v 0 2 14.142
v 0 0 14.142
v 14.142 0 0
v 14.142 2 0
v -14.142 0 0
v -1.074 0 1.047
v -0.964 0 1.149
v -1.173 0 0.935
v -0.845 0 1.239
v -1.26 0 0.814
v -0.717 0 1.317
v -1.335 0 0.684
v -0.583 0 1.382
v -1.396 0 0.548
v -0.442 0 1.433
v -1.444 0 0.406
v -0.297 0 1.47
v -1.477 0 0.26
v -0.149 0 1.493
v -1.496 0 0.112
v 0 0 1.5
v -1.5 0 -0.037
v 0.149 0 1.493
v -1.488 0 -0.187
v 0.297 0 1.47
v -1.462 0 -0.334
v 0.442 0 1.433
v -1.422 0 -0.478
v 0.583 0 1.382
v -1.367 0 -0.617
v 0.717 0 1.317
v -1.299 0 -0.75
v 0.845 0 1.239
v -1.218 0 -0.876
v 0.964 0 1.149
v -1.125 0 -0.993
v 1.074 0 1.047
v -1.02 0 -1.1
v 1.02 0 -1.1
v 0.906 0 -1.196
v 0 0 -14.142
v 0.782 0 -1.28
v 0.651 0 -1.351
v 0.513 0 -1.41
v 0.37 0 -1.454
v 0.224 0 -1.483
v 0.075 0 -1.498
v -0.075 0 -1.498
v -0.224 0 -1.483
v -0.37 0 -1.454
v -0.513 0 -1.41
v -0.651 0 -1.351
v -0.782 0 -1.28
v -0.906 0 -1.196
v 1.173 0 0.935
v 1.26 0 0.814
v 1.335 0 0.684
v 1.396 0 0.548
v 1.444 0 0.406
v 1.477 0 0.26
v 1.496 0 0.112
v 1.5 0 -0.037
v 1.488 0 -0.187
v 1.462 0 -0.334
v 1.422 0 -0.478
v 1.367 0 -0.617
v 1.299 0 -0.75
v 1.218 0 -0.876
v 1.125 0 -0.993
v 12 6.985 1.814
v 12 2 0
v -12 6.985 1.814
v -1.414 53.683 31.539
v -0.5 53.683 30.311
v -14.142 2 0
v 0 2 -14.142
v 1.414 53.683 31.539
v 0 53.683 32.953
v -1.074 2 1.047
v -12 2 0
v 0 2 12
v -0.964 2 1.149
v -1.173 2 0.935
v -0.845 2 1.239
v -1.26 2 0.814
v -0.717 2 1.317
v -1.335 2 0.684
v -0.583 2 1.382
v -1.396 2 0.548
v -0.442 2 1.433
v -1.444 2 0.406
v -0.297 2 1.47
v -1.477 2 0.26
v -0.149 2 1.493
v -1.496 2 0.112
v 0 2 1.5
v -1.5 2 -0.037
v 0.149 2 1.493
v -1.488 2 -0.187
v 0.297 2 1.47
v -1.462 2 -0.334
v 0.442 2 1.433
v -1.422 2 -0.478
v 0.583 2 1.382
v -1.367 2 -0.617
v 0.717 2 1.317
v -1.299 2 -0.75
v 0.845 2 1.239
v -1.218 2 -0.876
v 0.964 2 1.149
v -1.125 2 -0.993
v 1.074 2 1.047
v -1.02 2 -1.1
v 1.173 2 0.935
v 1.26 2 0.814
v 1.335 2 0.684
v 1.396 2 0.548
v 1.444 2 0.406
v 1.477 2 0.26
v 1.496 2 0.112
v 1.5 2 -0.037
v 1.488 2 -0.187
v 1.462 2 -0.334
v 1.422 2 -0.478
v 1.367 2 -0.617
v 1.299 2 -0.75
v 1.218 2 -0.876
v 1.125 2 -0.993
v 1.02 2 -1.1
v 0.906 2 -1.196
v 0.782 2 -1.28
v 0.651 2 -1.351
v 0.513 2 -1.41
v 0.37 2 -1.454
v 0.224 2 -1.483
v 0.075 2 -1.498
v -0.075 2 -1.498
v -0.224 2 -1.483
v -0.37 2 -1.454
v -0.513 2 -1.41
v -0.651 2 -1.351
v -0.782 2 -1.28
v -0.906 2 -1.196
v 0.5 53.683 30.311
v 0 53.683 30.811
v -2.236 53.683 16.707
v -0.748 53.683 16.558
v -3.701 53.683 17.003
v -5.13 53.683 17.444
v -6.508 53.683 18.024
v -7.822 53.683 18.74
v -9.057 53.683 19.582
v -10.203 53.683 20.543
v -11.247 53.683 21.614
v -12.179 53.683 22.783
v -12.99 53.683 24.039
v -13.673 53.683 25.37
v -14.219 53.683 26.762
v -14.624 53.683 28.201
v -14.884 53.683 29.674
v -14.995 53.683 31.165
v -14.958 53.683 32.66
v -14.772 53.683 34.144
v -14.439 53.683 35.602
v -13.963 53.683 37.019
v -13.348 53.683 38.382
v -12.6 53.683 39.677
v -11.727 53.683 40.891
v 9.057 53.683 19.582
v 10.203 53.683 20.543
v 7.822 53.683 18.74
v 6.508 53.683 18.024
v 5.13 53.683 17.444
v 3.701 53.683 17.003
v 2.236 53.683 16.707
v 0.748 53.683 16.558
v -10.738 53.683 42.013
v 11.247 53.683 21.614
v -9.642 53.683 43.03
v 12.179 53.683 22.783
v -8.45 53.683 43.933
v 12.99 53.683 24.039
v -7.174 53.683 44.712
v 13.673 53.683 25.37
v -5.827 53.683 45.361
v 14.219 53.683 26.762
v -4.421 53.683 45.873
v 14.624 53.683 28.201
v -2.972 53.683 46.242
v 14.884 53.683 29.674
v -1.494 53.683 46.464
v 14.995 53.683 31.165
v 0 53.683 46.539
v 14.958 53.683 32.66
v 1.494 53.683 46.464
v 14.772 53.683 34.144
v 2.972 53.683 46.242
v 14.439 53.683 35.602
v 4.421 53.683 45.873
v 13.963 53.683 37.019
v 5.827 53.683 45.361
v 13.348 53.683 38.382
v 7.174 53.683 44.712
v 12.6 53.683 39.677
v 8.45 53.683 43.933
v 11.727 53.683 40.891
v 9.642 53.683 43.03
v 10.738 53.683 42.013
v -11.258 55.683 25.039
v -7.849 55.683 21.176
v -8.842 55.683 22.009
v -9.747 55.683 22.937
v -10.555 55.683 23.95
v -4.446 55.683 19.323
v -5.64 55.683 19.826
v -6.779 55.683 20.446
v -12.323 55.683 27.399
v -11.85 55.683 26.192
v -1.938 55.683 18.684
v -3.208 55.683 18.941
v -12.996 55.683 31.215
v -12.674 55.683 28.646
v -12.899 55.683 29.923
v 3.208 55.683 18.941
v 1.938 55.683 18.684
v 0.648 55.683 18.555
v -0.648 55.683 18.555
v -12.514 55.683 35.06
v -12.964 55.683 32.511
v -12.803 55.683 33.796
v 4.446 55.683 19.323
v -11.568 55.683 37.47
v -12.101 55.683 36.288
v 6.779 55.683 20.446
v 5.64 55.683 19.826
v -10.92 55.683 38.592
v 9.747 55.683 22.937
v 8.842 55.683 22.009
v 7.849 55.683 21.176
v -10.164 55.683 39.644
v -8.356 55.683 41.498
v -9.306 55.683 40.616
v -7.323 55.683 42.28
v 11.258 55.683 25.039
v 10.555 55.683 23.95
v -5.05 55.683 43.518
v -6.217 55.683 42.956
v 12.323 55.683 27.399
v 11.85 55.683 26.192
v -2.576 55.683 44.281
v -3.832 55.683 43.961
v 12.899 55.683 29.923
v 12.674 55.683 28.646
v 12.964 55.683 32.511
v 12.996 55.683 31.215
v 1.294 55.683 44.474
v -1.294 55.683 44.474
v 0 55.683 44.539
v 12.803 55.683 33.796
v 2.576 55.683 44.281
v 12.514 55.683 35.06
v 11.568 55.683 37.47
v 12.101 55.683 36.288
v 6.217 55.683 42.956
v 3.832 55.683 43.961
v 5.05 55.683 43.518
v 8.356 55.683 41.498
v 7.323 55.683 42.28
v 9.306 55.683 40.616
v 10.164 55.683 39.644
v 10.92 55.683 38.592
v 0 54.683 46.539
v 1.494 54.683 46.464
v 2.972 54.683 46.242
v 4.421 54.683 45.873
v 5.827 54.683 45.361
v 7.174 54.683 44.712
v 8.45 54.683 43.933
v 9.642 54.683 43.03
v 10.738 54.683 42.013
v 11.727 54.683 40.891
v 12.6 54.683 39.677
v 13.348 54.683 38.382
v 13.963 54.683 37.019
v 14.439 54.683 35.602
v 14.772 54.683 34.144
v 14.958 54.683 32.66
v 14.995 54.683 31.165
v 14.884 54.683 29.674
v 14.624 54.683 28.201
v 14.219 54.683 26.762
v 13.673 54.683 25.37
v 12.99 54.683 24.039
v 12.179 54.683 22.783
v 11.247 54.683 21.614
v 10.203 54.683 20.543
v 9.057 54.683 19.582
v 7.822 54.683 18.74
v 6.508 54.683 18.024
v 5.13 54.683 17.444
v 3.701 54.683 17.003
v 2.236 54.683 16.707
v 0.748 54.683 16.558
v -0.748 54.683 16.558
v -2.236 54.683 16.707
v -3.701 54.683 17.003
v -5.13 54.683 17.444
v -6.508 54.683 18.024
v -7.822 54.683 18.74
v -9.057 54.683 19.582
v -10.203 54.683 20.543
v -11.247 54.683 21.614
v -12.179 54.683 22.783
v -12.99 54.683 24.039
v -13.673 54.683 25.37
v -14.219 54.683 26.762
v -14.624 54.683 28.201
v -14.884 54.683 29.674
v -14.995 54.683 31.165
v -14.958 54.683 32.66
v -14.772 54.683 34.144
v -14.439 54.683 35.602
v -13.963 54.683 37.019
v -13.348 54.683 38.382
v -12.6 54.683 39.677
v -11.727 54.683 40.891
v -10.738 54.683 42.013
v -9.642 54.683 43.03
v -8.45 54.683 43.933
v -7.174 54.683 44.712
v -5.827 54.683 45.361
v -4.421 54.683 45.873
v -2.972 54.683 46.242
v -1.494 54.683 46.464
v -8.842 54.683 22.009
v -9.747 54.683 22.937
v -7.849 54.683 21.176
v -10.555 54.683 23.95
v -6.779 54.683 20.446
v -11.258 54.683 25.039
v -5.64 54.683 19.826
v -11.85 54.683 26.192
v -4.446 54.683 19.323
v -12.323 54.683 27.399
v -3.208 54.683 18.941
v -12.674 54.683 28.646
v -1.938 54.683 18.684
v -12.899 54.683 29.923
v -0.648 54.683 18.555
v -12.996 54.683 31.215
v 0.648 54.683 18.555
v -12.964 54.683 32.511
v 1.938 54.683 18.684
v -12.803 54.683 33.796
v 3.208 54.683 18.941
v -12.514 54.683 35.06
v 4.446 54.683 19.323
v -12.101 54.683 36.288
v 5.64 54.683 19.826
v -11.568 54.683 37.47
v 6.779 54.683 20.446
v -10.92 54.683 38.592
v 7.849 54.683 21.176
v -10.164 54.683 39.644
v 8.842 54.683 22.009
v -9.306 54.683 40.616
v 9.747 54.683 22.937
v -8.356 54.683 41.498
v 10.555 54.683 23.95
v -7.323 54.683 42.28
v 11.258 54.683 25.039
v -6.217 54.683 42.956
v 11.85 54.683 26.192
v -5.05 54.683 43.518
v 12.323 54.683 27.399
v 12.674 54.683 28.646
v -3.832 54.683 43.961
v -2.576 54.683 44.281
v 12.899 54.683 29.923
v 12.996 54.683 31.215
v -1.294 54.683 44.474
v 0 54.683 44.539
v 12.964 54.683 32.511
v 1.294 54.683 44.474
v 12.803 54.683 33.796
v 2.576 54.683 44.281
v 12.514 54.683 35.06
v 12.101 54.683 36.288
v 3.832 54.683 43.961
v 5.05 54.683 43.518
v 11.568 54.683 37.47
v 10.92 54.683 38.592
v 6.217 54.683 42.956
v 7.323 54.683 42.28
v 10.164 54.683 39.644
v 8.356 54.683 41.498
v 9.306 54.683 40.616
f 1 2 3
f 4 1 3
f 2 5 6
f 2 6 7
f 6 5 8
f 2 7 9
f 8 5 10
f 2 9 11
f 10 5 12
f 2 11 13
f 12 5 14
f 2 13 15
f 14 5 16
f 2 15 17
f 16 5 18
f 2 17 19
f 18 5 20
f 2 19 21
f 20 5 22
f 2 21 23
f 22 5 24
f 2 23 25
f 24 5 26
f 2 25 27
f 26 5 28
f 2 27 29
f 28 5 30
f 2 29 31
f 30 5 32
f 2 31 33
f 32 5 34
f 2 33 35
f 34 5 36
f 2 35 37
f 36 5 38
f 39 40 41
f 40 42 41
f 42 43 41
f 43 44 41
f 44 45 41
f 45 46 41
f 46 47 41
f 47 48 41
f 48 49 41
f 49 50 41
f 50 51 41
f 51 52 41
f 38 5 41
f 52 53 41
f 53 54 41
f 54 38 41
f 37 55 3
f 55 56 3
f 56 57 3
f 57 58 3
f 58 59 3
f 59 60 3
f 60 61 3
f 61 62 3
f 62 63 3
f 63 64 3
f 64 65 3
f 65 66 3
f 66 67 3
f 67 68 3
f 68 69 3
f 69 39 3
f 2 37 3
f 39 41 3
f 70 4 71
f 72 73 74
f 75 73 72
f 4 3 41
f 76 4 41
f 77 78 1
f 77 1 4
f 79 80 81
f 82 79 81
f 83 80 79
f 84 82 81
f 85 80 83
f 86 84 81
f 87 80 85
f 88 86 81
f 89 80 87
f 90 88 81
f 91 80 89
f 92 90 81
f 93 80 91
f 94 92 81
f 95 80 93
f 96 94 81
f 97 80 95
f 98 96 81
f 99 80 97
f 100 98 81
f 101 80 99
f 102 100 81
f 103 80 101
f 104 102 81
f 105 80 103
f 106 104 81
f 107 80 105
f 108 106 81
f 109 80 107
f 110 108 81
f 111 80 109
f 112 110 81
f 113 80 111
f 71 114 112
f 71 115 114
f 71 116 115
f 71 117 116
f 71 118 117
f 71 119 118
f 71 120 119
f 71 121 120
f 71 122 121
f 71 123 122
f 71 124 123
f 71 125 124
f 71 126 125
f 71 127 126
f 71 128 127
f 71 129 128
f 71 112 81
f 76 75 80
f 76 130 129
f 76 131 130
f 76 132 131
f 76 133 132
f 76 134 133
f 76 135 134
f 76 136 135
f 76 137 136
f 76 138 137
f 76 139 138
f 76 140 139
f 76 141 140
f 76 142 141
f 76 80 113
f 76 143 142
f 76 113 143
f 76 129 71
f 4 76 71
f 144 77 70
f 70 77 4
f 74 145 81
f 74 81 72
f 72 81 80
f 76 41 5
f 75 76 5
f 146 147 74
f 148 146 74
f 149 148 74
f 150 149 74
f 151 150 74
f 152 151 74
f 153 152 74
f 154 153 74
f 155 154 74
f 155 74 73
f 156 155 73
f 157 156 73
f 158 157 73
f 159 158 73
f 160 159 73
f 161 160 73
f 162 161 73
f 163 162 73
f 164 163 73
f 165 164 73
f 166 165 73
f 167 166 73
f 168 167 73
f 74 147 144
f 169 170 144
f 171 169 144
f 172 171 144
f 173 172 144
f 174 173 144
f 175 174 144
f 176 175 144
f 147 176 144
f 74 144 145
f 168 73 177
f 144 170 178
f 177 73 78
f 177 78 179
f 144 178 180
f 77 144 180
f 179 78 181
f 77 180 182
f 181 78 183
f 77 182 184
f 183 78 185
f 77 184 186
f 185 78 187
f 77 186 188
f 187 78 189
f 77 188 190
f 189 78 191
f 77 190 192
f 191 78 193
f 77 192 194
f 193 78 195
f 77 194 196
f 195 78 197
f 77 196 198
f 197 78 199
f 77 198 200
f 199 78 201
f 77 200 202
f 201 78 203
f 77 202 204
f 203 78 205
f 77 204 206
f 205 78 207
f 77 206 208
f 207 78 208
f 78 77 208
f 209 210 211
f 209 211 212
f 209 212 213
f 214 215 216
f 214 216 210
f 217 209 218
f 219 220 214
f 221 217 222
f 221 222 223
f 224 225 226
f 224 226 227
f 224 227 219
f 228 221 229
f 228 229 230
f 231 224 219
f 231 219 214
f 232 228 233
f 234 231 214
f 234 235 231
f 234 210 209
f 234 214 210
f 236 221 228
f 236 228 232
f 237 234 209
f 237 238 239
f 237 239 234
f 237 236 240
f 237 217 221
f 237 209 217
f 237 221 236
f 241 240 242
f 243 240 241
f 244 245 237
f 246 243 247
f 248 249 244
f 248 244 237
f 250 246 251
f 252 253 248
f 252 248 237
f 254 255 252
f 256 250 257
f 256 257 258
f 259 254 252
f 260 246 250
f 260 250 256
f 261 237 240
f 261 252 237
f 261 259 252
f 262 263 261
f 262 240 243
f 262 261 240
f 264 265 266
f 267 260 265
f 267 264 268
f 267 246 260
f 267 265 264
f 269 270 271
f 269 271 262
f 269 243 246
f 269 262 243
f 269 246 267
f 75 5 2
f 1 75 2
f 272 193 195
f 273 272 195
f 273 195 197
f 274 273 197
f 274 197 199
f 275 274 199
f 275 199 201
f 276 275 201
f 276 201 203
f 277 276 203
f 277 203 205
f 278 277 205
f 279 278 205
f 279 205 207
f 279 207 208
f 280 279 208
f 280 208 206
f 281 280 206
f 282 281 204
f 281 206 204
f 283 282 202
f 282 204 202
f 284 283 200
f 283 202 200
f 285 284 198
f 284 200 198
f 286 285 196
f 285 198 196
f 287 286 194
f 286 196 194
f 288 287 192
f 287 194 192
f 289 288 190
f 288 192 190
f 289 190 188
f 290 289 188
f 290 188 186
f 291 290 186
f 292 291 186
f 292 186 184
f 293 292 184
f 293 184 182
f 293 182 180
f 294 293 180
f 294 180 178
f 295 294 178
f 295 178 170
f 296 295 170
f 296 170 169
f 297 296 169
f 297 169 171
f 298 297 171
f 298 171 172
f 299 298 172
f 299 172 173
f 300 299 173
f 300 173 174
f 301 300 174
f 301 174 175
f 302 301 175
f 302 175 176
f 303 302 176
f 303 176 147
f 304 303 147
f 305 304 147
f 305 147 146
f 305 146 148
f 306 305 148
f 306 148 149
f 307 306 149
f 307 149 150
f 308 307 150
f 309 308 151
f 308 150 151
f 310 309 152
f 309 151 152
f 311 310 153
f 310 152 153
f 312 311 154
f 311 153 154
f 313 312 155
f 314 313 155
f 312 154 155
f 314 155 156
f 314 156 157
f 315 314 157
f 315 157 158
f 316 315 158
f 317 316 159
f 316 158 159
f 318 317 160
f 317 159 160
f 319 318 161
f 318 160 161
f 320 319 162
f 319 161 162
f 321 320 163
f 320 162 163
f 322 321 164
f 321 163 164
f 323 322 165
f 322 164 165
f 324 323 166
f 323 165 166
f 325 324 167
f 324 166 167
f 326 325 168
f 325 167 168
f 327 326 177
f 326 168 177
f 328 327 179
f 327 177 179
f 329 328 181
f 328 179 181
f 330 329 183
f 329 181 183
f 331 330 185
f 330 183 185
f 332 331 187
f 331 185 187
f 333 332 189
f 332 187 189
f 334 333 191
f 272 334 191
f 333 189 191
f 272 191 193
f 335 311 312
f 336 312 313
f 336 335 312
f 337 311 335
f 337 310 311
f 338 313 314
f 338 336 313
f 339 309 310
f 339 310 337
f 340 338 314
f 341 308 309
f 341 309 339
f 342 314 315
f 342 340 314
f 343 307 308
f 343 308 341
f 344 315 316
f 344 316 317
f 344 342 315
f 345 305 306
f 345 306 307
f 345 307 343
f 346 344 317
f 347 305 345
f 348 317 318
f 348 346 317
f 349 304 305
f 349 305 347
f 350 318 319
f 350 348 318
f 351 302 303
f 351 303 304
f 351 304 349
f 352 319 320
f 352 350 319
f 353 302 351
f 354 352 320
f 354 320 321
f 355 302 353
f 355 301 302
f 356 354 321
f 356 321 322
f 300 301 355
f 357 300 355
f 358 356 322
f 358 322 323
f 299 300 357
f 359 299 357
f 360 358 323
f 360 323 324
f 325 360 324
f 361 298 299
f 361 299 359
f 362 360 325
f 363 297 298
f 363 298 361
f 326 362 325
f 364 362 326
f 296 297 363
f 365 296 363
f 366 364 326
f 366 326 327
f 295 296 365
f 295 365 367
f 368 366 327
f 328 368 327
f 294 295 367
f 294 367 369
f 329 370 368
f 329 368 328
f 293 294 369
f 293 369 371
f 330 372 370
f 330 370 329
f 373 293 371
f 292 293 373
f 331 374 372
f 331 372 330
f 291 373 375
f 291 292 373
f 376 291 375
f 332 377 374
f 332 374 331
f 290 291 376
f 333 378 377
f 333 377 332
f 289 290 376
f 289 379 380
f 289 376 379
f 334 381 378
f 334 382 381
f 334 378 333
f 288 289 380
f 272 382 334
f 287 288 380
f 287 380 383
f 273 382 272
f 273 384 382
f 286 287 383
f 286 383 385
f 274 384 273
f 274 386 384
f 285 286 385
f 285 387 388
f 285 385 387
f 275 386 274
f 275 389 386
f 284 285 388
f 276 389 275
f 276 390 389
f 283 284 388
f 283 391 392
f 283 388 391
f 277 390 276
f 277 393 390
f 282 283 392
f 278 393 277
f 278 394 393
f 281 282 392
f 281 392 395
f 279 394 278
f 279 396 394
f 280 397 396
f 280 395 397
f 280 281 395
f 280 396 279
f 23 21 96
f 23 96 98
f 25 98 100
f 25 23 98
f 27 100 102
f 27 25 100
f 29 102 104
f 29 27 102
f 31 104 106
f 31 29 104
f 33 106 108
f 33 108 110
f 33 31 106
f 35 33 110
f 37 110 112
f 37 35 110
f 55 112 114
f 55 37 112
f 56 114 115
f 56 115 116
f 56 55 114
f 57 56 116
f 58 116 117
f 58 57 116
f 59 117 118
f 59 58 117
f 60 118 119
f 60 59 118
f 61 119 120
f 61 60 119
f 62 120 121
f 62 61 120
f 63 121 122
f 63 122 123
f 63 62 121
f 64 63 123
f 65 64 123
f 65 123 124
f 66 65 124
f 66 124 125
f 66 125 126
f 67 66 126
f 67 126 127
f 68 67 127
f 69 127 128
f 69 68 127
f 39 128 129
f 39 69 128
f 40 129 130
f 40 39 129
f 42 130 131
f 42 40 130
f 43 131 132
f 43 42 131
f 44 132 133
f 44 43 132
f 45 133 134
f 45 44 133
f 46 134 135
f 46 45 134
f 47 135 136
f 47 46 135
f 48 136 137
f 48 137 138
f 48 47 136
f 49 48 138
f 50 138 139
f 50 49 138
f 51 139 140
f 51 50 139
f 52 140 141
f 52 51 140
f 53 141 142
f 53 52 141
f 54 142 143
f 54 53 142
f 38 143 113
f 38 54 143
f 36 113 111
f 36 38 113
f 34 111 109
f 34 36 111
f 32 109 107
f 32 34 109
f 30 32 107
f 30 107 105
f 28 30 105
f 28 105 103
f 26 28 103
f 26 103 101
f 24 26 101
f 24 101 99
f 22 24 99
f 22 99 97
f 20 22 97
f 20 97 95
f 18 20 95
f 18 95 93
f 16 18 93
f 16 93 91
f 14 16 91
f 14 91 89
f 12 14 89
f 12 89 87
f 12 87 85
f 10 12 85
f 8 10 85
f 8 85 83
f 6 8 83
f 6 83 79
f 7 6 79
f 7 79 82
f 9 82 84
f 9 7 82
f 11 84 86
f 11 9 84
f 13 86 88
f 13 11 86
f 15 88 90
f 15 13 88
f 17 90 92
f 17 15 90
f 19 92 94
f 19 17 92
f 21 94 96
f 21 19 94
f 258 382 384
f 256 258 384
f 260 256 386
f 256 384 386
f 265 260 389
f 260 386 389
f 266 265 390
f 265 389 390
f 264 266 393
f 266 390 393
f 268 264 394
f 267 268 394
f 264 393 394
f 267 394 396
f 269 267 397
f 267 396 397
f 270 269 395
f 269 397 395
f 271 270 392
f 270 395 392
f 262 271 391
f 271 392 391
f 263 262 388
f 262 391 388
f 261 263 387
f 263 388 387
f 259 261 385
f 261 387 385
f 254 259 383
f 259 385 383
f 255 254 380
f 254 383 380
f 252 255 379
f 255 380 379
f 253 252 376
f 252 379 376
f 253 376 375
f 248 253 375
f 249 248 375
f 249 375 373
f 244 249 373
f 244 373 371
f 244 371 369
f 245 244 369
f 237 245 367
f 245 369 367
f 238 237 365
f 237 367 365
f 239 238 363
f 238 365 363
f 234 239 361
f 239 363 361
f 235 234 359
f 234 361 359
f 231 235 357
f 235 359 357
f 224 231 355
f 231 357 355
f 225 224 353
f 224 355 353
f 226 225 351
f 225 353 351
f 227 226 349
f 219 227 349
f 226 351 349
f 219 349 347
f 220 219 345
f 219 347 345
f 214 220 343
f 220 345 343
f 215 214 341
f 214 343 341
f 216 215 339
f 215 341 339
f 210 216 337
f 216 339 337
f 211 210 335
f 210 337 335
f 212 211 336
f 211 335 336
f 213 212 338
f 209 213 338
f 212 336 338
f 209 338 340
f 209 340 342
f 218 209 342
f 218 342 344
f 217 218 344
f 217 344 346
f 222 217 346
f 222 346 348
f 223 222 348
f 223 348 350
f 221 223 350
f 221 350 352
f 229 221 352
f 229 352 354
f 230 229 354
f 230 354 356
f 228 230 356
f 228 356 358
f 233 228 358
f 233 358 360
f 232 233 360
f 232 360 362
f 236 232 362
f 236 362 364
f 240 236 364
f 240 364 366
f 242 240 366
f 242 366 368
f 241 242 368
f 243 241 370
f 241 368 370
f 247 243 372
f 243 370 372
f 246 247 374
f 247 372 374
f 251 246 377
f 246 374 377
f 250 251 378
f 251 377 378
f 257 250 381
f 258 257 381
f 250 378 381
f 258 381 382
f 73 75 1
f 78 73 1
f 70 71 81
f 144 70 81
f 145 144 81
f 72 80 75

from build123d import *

# Parameters (mm, degrees)
SKETCH1_R           = 1.5
BOSS_EXTRUDE2_DEPTH = 2
BOSS_EXTRUDE3_DEPTH = 55
CUT_EXTRUDE1_DEPTH  = 2
CUT_EXTRUDE2_DEPTH  = 2
SKETCH8_R           = 15
BOSS_EXTRUDE6_DEPTH = 2
CUT_EXTRUDE3_START  = -1
SKETCH12_R          = 15
SKETCH12_R_2        = 13
CUT_EXTRUDE3_DEPTH  = 1


with BuildPart() as part:
    # Sketch1 → Boss-Extrude2 (new body)
    with BuildSketch(Plane(origin=(0, 0, 0), x_dir=(1, 0, 0), z_dir=(0, 1, 0))):
        Polygon((0, 14.142135624), (-14.142135624, 0), (0, -14.142135624), (14.142135624, 0), align=None)
        with Locations(Location((0, 0, 0), (0, 0, 270))):
            Circle(SKETCH1_R, mode=Mode.SUBTRACT)
    extrude(amount=BOSS_EXTRUDE2_DEPTH)

    # Sketch3 → Boss-Extrude3 (add, along a direction that is not the sketch's normal)
    with BuildSketch(Plane(origin=(0, 2, 0), x_dir=(1, 0, 0), z_dir=(0, 1, 0))):
        Polygon((0, -14.142135624), (14.142135624, 0), (12, 0), (0, -12), (-12, 0), (-14.142135624, 0), align=None)
    extrude(amount=BOSS_EXTRUDE3_DEPTH, dir=(0, 0.9396926207859093, 0.34202014332566616))

    # Sketch5 → Cut-Extrude1 (cut)
    with BuildSketch(Plane(origin=(6.290436868, -2.289531781, 6.290436868), x_dir=(0.643493123501823, -0.23421234290964707, -0.7287394448186825), z_dir=(0.6847910787717363, -0.24924356936395234, 0.6847910787717364))):
        Polygon((8.63194234, 6.716280495), (-17.181272543, 55.28250268), (-34.646941723, 50.929296953), align=None)
    extrude(amount=-CUT_EXTRUDE1_DEPTH, mode=Mode.SUBTRACT)

    # Sketch6 → Cut-Extrude2 (cut)
    with BuildSketch(Plane(origin=(-6.290436868, -2.289531781, 6.290436868), x_dir=(0.6434931235018196, 0.23421234290964207, 0.7287394448186869), z_dir=(-0.6847910787717418, -0.24924356936395037, 0.6847910787717316))):
        Polygon((17.181272543, 55.28250268), (34.646941723, 50.929296953), (-8.63194234, 6.716280495), align=None)
    extrude(amount=-CUT_EXTRUDE2_DEPTH, mode=Mode.SUBTRACT)

    # Sketch8 → Boss-Extrude6 (add)
    with BuildSketch(Plane(origin=(0, 53.683094143, 0), x_dir=(1, 0, 0), z_dir=(0, 1, 0))):
        with Locations(Location((0, -31.539029944, 0), (0, 0, 270))):
            Circle(SKETCH8_R)
    extrude(amount=BOSS_EXTRUDE6_DEPTH)

    # Sketch12 → Cut-Extrude3 (cut)
    with BuildSketch(Plane(origin=(0, 55.683094143, 0), x_dir=(1, 0, 0), z_dir=(0, 1, 0)).offset(CUT_EXTRUDE3_START)):
        with Locations(Location((0, -31.539029944, 0), (0, 0, 270))):
            Circle(SKETCH12_R)
        with Locations(Location((0, -31.539029944, 0), (0, 0, 270))):
            Circle(SKETCH12_R_2, mode=Mode.SUBTRACT)
    extrude(amount=CUT_EXTRUDE3_DEPTH, mode=Mode.SUBTRACT)


solid = part.part
